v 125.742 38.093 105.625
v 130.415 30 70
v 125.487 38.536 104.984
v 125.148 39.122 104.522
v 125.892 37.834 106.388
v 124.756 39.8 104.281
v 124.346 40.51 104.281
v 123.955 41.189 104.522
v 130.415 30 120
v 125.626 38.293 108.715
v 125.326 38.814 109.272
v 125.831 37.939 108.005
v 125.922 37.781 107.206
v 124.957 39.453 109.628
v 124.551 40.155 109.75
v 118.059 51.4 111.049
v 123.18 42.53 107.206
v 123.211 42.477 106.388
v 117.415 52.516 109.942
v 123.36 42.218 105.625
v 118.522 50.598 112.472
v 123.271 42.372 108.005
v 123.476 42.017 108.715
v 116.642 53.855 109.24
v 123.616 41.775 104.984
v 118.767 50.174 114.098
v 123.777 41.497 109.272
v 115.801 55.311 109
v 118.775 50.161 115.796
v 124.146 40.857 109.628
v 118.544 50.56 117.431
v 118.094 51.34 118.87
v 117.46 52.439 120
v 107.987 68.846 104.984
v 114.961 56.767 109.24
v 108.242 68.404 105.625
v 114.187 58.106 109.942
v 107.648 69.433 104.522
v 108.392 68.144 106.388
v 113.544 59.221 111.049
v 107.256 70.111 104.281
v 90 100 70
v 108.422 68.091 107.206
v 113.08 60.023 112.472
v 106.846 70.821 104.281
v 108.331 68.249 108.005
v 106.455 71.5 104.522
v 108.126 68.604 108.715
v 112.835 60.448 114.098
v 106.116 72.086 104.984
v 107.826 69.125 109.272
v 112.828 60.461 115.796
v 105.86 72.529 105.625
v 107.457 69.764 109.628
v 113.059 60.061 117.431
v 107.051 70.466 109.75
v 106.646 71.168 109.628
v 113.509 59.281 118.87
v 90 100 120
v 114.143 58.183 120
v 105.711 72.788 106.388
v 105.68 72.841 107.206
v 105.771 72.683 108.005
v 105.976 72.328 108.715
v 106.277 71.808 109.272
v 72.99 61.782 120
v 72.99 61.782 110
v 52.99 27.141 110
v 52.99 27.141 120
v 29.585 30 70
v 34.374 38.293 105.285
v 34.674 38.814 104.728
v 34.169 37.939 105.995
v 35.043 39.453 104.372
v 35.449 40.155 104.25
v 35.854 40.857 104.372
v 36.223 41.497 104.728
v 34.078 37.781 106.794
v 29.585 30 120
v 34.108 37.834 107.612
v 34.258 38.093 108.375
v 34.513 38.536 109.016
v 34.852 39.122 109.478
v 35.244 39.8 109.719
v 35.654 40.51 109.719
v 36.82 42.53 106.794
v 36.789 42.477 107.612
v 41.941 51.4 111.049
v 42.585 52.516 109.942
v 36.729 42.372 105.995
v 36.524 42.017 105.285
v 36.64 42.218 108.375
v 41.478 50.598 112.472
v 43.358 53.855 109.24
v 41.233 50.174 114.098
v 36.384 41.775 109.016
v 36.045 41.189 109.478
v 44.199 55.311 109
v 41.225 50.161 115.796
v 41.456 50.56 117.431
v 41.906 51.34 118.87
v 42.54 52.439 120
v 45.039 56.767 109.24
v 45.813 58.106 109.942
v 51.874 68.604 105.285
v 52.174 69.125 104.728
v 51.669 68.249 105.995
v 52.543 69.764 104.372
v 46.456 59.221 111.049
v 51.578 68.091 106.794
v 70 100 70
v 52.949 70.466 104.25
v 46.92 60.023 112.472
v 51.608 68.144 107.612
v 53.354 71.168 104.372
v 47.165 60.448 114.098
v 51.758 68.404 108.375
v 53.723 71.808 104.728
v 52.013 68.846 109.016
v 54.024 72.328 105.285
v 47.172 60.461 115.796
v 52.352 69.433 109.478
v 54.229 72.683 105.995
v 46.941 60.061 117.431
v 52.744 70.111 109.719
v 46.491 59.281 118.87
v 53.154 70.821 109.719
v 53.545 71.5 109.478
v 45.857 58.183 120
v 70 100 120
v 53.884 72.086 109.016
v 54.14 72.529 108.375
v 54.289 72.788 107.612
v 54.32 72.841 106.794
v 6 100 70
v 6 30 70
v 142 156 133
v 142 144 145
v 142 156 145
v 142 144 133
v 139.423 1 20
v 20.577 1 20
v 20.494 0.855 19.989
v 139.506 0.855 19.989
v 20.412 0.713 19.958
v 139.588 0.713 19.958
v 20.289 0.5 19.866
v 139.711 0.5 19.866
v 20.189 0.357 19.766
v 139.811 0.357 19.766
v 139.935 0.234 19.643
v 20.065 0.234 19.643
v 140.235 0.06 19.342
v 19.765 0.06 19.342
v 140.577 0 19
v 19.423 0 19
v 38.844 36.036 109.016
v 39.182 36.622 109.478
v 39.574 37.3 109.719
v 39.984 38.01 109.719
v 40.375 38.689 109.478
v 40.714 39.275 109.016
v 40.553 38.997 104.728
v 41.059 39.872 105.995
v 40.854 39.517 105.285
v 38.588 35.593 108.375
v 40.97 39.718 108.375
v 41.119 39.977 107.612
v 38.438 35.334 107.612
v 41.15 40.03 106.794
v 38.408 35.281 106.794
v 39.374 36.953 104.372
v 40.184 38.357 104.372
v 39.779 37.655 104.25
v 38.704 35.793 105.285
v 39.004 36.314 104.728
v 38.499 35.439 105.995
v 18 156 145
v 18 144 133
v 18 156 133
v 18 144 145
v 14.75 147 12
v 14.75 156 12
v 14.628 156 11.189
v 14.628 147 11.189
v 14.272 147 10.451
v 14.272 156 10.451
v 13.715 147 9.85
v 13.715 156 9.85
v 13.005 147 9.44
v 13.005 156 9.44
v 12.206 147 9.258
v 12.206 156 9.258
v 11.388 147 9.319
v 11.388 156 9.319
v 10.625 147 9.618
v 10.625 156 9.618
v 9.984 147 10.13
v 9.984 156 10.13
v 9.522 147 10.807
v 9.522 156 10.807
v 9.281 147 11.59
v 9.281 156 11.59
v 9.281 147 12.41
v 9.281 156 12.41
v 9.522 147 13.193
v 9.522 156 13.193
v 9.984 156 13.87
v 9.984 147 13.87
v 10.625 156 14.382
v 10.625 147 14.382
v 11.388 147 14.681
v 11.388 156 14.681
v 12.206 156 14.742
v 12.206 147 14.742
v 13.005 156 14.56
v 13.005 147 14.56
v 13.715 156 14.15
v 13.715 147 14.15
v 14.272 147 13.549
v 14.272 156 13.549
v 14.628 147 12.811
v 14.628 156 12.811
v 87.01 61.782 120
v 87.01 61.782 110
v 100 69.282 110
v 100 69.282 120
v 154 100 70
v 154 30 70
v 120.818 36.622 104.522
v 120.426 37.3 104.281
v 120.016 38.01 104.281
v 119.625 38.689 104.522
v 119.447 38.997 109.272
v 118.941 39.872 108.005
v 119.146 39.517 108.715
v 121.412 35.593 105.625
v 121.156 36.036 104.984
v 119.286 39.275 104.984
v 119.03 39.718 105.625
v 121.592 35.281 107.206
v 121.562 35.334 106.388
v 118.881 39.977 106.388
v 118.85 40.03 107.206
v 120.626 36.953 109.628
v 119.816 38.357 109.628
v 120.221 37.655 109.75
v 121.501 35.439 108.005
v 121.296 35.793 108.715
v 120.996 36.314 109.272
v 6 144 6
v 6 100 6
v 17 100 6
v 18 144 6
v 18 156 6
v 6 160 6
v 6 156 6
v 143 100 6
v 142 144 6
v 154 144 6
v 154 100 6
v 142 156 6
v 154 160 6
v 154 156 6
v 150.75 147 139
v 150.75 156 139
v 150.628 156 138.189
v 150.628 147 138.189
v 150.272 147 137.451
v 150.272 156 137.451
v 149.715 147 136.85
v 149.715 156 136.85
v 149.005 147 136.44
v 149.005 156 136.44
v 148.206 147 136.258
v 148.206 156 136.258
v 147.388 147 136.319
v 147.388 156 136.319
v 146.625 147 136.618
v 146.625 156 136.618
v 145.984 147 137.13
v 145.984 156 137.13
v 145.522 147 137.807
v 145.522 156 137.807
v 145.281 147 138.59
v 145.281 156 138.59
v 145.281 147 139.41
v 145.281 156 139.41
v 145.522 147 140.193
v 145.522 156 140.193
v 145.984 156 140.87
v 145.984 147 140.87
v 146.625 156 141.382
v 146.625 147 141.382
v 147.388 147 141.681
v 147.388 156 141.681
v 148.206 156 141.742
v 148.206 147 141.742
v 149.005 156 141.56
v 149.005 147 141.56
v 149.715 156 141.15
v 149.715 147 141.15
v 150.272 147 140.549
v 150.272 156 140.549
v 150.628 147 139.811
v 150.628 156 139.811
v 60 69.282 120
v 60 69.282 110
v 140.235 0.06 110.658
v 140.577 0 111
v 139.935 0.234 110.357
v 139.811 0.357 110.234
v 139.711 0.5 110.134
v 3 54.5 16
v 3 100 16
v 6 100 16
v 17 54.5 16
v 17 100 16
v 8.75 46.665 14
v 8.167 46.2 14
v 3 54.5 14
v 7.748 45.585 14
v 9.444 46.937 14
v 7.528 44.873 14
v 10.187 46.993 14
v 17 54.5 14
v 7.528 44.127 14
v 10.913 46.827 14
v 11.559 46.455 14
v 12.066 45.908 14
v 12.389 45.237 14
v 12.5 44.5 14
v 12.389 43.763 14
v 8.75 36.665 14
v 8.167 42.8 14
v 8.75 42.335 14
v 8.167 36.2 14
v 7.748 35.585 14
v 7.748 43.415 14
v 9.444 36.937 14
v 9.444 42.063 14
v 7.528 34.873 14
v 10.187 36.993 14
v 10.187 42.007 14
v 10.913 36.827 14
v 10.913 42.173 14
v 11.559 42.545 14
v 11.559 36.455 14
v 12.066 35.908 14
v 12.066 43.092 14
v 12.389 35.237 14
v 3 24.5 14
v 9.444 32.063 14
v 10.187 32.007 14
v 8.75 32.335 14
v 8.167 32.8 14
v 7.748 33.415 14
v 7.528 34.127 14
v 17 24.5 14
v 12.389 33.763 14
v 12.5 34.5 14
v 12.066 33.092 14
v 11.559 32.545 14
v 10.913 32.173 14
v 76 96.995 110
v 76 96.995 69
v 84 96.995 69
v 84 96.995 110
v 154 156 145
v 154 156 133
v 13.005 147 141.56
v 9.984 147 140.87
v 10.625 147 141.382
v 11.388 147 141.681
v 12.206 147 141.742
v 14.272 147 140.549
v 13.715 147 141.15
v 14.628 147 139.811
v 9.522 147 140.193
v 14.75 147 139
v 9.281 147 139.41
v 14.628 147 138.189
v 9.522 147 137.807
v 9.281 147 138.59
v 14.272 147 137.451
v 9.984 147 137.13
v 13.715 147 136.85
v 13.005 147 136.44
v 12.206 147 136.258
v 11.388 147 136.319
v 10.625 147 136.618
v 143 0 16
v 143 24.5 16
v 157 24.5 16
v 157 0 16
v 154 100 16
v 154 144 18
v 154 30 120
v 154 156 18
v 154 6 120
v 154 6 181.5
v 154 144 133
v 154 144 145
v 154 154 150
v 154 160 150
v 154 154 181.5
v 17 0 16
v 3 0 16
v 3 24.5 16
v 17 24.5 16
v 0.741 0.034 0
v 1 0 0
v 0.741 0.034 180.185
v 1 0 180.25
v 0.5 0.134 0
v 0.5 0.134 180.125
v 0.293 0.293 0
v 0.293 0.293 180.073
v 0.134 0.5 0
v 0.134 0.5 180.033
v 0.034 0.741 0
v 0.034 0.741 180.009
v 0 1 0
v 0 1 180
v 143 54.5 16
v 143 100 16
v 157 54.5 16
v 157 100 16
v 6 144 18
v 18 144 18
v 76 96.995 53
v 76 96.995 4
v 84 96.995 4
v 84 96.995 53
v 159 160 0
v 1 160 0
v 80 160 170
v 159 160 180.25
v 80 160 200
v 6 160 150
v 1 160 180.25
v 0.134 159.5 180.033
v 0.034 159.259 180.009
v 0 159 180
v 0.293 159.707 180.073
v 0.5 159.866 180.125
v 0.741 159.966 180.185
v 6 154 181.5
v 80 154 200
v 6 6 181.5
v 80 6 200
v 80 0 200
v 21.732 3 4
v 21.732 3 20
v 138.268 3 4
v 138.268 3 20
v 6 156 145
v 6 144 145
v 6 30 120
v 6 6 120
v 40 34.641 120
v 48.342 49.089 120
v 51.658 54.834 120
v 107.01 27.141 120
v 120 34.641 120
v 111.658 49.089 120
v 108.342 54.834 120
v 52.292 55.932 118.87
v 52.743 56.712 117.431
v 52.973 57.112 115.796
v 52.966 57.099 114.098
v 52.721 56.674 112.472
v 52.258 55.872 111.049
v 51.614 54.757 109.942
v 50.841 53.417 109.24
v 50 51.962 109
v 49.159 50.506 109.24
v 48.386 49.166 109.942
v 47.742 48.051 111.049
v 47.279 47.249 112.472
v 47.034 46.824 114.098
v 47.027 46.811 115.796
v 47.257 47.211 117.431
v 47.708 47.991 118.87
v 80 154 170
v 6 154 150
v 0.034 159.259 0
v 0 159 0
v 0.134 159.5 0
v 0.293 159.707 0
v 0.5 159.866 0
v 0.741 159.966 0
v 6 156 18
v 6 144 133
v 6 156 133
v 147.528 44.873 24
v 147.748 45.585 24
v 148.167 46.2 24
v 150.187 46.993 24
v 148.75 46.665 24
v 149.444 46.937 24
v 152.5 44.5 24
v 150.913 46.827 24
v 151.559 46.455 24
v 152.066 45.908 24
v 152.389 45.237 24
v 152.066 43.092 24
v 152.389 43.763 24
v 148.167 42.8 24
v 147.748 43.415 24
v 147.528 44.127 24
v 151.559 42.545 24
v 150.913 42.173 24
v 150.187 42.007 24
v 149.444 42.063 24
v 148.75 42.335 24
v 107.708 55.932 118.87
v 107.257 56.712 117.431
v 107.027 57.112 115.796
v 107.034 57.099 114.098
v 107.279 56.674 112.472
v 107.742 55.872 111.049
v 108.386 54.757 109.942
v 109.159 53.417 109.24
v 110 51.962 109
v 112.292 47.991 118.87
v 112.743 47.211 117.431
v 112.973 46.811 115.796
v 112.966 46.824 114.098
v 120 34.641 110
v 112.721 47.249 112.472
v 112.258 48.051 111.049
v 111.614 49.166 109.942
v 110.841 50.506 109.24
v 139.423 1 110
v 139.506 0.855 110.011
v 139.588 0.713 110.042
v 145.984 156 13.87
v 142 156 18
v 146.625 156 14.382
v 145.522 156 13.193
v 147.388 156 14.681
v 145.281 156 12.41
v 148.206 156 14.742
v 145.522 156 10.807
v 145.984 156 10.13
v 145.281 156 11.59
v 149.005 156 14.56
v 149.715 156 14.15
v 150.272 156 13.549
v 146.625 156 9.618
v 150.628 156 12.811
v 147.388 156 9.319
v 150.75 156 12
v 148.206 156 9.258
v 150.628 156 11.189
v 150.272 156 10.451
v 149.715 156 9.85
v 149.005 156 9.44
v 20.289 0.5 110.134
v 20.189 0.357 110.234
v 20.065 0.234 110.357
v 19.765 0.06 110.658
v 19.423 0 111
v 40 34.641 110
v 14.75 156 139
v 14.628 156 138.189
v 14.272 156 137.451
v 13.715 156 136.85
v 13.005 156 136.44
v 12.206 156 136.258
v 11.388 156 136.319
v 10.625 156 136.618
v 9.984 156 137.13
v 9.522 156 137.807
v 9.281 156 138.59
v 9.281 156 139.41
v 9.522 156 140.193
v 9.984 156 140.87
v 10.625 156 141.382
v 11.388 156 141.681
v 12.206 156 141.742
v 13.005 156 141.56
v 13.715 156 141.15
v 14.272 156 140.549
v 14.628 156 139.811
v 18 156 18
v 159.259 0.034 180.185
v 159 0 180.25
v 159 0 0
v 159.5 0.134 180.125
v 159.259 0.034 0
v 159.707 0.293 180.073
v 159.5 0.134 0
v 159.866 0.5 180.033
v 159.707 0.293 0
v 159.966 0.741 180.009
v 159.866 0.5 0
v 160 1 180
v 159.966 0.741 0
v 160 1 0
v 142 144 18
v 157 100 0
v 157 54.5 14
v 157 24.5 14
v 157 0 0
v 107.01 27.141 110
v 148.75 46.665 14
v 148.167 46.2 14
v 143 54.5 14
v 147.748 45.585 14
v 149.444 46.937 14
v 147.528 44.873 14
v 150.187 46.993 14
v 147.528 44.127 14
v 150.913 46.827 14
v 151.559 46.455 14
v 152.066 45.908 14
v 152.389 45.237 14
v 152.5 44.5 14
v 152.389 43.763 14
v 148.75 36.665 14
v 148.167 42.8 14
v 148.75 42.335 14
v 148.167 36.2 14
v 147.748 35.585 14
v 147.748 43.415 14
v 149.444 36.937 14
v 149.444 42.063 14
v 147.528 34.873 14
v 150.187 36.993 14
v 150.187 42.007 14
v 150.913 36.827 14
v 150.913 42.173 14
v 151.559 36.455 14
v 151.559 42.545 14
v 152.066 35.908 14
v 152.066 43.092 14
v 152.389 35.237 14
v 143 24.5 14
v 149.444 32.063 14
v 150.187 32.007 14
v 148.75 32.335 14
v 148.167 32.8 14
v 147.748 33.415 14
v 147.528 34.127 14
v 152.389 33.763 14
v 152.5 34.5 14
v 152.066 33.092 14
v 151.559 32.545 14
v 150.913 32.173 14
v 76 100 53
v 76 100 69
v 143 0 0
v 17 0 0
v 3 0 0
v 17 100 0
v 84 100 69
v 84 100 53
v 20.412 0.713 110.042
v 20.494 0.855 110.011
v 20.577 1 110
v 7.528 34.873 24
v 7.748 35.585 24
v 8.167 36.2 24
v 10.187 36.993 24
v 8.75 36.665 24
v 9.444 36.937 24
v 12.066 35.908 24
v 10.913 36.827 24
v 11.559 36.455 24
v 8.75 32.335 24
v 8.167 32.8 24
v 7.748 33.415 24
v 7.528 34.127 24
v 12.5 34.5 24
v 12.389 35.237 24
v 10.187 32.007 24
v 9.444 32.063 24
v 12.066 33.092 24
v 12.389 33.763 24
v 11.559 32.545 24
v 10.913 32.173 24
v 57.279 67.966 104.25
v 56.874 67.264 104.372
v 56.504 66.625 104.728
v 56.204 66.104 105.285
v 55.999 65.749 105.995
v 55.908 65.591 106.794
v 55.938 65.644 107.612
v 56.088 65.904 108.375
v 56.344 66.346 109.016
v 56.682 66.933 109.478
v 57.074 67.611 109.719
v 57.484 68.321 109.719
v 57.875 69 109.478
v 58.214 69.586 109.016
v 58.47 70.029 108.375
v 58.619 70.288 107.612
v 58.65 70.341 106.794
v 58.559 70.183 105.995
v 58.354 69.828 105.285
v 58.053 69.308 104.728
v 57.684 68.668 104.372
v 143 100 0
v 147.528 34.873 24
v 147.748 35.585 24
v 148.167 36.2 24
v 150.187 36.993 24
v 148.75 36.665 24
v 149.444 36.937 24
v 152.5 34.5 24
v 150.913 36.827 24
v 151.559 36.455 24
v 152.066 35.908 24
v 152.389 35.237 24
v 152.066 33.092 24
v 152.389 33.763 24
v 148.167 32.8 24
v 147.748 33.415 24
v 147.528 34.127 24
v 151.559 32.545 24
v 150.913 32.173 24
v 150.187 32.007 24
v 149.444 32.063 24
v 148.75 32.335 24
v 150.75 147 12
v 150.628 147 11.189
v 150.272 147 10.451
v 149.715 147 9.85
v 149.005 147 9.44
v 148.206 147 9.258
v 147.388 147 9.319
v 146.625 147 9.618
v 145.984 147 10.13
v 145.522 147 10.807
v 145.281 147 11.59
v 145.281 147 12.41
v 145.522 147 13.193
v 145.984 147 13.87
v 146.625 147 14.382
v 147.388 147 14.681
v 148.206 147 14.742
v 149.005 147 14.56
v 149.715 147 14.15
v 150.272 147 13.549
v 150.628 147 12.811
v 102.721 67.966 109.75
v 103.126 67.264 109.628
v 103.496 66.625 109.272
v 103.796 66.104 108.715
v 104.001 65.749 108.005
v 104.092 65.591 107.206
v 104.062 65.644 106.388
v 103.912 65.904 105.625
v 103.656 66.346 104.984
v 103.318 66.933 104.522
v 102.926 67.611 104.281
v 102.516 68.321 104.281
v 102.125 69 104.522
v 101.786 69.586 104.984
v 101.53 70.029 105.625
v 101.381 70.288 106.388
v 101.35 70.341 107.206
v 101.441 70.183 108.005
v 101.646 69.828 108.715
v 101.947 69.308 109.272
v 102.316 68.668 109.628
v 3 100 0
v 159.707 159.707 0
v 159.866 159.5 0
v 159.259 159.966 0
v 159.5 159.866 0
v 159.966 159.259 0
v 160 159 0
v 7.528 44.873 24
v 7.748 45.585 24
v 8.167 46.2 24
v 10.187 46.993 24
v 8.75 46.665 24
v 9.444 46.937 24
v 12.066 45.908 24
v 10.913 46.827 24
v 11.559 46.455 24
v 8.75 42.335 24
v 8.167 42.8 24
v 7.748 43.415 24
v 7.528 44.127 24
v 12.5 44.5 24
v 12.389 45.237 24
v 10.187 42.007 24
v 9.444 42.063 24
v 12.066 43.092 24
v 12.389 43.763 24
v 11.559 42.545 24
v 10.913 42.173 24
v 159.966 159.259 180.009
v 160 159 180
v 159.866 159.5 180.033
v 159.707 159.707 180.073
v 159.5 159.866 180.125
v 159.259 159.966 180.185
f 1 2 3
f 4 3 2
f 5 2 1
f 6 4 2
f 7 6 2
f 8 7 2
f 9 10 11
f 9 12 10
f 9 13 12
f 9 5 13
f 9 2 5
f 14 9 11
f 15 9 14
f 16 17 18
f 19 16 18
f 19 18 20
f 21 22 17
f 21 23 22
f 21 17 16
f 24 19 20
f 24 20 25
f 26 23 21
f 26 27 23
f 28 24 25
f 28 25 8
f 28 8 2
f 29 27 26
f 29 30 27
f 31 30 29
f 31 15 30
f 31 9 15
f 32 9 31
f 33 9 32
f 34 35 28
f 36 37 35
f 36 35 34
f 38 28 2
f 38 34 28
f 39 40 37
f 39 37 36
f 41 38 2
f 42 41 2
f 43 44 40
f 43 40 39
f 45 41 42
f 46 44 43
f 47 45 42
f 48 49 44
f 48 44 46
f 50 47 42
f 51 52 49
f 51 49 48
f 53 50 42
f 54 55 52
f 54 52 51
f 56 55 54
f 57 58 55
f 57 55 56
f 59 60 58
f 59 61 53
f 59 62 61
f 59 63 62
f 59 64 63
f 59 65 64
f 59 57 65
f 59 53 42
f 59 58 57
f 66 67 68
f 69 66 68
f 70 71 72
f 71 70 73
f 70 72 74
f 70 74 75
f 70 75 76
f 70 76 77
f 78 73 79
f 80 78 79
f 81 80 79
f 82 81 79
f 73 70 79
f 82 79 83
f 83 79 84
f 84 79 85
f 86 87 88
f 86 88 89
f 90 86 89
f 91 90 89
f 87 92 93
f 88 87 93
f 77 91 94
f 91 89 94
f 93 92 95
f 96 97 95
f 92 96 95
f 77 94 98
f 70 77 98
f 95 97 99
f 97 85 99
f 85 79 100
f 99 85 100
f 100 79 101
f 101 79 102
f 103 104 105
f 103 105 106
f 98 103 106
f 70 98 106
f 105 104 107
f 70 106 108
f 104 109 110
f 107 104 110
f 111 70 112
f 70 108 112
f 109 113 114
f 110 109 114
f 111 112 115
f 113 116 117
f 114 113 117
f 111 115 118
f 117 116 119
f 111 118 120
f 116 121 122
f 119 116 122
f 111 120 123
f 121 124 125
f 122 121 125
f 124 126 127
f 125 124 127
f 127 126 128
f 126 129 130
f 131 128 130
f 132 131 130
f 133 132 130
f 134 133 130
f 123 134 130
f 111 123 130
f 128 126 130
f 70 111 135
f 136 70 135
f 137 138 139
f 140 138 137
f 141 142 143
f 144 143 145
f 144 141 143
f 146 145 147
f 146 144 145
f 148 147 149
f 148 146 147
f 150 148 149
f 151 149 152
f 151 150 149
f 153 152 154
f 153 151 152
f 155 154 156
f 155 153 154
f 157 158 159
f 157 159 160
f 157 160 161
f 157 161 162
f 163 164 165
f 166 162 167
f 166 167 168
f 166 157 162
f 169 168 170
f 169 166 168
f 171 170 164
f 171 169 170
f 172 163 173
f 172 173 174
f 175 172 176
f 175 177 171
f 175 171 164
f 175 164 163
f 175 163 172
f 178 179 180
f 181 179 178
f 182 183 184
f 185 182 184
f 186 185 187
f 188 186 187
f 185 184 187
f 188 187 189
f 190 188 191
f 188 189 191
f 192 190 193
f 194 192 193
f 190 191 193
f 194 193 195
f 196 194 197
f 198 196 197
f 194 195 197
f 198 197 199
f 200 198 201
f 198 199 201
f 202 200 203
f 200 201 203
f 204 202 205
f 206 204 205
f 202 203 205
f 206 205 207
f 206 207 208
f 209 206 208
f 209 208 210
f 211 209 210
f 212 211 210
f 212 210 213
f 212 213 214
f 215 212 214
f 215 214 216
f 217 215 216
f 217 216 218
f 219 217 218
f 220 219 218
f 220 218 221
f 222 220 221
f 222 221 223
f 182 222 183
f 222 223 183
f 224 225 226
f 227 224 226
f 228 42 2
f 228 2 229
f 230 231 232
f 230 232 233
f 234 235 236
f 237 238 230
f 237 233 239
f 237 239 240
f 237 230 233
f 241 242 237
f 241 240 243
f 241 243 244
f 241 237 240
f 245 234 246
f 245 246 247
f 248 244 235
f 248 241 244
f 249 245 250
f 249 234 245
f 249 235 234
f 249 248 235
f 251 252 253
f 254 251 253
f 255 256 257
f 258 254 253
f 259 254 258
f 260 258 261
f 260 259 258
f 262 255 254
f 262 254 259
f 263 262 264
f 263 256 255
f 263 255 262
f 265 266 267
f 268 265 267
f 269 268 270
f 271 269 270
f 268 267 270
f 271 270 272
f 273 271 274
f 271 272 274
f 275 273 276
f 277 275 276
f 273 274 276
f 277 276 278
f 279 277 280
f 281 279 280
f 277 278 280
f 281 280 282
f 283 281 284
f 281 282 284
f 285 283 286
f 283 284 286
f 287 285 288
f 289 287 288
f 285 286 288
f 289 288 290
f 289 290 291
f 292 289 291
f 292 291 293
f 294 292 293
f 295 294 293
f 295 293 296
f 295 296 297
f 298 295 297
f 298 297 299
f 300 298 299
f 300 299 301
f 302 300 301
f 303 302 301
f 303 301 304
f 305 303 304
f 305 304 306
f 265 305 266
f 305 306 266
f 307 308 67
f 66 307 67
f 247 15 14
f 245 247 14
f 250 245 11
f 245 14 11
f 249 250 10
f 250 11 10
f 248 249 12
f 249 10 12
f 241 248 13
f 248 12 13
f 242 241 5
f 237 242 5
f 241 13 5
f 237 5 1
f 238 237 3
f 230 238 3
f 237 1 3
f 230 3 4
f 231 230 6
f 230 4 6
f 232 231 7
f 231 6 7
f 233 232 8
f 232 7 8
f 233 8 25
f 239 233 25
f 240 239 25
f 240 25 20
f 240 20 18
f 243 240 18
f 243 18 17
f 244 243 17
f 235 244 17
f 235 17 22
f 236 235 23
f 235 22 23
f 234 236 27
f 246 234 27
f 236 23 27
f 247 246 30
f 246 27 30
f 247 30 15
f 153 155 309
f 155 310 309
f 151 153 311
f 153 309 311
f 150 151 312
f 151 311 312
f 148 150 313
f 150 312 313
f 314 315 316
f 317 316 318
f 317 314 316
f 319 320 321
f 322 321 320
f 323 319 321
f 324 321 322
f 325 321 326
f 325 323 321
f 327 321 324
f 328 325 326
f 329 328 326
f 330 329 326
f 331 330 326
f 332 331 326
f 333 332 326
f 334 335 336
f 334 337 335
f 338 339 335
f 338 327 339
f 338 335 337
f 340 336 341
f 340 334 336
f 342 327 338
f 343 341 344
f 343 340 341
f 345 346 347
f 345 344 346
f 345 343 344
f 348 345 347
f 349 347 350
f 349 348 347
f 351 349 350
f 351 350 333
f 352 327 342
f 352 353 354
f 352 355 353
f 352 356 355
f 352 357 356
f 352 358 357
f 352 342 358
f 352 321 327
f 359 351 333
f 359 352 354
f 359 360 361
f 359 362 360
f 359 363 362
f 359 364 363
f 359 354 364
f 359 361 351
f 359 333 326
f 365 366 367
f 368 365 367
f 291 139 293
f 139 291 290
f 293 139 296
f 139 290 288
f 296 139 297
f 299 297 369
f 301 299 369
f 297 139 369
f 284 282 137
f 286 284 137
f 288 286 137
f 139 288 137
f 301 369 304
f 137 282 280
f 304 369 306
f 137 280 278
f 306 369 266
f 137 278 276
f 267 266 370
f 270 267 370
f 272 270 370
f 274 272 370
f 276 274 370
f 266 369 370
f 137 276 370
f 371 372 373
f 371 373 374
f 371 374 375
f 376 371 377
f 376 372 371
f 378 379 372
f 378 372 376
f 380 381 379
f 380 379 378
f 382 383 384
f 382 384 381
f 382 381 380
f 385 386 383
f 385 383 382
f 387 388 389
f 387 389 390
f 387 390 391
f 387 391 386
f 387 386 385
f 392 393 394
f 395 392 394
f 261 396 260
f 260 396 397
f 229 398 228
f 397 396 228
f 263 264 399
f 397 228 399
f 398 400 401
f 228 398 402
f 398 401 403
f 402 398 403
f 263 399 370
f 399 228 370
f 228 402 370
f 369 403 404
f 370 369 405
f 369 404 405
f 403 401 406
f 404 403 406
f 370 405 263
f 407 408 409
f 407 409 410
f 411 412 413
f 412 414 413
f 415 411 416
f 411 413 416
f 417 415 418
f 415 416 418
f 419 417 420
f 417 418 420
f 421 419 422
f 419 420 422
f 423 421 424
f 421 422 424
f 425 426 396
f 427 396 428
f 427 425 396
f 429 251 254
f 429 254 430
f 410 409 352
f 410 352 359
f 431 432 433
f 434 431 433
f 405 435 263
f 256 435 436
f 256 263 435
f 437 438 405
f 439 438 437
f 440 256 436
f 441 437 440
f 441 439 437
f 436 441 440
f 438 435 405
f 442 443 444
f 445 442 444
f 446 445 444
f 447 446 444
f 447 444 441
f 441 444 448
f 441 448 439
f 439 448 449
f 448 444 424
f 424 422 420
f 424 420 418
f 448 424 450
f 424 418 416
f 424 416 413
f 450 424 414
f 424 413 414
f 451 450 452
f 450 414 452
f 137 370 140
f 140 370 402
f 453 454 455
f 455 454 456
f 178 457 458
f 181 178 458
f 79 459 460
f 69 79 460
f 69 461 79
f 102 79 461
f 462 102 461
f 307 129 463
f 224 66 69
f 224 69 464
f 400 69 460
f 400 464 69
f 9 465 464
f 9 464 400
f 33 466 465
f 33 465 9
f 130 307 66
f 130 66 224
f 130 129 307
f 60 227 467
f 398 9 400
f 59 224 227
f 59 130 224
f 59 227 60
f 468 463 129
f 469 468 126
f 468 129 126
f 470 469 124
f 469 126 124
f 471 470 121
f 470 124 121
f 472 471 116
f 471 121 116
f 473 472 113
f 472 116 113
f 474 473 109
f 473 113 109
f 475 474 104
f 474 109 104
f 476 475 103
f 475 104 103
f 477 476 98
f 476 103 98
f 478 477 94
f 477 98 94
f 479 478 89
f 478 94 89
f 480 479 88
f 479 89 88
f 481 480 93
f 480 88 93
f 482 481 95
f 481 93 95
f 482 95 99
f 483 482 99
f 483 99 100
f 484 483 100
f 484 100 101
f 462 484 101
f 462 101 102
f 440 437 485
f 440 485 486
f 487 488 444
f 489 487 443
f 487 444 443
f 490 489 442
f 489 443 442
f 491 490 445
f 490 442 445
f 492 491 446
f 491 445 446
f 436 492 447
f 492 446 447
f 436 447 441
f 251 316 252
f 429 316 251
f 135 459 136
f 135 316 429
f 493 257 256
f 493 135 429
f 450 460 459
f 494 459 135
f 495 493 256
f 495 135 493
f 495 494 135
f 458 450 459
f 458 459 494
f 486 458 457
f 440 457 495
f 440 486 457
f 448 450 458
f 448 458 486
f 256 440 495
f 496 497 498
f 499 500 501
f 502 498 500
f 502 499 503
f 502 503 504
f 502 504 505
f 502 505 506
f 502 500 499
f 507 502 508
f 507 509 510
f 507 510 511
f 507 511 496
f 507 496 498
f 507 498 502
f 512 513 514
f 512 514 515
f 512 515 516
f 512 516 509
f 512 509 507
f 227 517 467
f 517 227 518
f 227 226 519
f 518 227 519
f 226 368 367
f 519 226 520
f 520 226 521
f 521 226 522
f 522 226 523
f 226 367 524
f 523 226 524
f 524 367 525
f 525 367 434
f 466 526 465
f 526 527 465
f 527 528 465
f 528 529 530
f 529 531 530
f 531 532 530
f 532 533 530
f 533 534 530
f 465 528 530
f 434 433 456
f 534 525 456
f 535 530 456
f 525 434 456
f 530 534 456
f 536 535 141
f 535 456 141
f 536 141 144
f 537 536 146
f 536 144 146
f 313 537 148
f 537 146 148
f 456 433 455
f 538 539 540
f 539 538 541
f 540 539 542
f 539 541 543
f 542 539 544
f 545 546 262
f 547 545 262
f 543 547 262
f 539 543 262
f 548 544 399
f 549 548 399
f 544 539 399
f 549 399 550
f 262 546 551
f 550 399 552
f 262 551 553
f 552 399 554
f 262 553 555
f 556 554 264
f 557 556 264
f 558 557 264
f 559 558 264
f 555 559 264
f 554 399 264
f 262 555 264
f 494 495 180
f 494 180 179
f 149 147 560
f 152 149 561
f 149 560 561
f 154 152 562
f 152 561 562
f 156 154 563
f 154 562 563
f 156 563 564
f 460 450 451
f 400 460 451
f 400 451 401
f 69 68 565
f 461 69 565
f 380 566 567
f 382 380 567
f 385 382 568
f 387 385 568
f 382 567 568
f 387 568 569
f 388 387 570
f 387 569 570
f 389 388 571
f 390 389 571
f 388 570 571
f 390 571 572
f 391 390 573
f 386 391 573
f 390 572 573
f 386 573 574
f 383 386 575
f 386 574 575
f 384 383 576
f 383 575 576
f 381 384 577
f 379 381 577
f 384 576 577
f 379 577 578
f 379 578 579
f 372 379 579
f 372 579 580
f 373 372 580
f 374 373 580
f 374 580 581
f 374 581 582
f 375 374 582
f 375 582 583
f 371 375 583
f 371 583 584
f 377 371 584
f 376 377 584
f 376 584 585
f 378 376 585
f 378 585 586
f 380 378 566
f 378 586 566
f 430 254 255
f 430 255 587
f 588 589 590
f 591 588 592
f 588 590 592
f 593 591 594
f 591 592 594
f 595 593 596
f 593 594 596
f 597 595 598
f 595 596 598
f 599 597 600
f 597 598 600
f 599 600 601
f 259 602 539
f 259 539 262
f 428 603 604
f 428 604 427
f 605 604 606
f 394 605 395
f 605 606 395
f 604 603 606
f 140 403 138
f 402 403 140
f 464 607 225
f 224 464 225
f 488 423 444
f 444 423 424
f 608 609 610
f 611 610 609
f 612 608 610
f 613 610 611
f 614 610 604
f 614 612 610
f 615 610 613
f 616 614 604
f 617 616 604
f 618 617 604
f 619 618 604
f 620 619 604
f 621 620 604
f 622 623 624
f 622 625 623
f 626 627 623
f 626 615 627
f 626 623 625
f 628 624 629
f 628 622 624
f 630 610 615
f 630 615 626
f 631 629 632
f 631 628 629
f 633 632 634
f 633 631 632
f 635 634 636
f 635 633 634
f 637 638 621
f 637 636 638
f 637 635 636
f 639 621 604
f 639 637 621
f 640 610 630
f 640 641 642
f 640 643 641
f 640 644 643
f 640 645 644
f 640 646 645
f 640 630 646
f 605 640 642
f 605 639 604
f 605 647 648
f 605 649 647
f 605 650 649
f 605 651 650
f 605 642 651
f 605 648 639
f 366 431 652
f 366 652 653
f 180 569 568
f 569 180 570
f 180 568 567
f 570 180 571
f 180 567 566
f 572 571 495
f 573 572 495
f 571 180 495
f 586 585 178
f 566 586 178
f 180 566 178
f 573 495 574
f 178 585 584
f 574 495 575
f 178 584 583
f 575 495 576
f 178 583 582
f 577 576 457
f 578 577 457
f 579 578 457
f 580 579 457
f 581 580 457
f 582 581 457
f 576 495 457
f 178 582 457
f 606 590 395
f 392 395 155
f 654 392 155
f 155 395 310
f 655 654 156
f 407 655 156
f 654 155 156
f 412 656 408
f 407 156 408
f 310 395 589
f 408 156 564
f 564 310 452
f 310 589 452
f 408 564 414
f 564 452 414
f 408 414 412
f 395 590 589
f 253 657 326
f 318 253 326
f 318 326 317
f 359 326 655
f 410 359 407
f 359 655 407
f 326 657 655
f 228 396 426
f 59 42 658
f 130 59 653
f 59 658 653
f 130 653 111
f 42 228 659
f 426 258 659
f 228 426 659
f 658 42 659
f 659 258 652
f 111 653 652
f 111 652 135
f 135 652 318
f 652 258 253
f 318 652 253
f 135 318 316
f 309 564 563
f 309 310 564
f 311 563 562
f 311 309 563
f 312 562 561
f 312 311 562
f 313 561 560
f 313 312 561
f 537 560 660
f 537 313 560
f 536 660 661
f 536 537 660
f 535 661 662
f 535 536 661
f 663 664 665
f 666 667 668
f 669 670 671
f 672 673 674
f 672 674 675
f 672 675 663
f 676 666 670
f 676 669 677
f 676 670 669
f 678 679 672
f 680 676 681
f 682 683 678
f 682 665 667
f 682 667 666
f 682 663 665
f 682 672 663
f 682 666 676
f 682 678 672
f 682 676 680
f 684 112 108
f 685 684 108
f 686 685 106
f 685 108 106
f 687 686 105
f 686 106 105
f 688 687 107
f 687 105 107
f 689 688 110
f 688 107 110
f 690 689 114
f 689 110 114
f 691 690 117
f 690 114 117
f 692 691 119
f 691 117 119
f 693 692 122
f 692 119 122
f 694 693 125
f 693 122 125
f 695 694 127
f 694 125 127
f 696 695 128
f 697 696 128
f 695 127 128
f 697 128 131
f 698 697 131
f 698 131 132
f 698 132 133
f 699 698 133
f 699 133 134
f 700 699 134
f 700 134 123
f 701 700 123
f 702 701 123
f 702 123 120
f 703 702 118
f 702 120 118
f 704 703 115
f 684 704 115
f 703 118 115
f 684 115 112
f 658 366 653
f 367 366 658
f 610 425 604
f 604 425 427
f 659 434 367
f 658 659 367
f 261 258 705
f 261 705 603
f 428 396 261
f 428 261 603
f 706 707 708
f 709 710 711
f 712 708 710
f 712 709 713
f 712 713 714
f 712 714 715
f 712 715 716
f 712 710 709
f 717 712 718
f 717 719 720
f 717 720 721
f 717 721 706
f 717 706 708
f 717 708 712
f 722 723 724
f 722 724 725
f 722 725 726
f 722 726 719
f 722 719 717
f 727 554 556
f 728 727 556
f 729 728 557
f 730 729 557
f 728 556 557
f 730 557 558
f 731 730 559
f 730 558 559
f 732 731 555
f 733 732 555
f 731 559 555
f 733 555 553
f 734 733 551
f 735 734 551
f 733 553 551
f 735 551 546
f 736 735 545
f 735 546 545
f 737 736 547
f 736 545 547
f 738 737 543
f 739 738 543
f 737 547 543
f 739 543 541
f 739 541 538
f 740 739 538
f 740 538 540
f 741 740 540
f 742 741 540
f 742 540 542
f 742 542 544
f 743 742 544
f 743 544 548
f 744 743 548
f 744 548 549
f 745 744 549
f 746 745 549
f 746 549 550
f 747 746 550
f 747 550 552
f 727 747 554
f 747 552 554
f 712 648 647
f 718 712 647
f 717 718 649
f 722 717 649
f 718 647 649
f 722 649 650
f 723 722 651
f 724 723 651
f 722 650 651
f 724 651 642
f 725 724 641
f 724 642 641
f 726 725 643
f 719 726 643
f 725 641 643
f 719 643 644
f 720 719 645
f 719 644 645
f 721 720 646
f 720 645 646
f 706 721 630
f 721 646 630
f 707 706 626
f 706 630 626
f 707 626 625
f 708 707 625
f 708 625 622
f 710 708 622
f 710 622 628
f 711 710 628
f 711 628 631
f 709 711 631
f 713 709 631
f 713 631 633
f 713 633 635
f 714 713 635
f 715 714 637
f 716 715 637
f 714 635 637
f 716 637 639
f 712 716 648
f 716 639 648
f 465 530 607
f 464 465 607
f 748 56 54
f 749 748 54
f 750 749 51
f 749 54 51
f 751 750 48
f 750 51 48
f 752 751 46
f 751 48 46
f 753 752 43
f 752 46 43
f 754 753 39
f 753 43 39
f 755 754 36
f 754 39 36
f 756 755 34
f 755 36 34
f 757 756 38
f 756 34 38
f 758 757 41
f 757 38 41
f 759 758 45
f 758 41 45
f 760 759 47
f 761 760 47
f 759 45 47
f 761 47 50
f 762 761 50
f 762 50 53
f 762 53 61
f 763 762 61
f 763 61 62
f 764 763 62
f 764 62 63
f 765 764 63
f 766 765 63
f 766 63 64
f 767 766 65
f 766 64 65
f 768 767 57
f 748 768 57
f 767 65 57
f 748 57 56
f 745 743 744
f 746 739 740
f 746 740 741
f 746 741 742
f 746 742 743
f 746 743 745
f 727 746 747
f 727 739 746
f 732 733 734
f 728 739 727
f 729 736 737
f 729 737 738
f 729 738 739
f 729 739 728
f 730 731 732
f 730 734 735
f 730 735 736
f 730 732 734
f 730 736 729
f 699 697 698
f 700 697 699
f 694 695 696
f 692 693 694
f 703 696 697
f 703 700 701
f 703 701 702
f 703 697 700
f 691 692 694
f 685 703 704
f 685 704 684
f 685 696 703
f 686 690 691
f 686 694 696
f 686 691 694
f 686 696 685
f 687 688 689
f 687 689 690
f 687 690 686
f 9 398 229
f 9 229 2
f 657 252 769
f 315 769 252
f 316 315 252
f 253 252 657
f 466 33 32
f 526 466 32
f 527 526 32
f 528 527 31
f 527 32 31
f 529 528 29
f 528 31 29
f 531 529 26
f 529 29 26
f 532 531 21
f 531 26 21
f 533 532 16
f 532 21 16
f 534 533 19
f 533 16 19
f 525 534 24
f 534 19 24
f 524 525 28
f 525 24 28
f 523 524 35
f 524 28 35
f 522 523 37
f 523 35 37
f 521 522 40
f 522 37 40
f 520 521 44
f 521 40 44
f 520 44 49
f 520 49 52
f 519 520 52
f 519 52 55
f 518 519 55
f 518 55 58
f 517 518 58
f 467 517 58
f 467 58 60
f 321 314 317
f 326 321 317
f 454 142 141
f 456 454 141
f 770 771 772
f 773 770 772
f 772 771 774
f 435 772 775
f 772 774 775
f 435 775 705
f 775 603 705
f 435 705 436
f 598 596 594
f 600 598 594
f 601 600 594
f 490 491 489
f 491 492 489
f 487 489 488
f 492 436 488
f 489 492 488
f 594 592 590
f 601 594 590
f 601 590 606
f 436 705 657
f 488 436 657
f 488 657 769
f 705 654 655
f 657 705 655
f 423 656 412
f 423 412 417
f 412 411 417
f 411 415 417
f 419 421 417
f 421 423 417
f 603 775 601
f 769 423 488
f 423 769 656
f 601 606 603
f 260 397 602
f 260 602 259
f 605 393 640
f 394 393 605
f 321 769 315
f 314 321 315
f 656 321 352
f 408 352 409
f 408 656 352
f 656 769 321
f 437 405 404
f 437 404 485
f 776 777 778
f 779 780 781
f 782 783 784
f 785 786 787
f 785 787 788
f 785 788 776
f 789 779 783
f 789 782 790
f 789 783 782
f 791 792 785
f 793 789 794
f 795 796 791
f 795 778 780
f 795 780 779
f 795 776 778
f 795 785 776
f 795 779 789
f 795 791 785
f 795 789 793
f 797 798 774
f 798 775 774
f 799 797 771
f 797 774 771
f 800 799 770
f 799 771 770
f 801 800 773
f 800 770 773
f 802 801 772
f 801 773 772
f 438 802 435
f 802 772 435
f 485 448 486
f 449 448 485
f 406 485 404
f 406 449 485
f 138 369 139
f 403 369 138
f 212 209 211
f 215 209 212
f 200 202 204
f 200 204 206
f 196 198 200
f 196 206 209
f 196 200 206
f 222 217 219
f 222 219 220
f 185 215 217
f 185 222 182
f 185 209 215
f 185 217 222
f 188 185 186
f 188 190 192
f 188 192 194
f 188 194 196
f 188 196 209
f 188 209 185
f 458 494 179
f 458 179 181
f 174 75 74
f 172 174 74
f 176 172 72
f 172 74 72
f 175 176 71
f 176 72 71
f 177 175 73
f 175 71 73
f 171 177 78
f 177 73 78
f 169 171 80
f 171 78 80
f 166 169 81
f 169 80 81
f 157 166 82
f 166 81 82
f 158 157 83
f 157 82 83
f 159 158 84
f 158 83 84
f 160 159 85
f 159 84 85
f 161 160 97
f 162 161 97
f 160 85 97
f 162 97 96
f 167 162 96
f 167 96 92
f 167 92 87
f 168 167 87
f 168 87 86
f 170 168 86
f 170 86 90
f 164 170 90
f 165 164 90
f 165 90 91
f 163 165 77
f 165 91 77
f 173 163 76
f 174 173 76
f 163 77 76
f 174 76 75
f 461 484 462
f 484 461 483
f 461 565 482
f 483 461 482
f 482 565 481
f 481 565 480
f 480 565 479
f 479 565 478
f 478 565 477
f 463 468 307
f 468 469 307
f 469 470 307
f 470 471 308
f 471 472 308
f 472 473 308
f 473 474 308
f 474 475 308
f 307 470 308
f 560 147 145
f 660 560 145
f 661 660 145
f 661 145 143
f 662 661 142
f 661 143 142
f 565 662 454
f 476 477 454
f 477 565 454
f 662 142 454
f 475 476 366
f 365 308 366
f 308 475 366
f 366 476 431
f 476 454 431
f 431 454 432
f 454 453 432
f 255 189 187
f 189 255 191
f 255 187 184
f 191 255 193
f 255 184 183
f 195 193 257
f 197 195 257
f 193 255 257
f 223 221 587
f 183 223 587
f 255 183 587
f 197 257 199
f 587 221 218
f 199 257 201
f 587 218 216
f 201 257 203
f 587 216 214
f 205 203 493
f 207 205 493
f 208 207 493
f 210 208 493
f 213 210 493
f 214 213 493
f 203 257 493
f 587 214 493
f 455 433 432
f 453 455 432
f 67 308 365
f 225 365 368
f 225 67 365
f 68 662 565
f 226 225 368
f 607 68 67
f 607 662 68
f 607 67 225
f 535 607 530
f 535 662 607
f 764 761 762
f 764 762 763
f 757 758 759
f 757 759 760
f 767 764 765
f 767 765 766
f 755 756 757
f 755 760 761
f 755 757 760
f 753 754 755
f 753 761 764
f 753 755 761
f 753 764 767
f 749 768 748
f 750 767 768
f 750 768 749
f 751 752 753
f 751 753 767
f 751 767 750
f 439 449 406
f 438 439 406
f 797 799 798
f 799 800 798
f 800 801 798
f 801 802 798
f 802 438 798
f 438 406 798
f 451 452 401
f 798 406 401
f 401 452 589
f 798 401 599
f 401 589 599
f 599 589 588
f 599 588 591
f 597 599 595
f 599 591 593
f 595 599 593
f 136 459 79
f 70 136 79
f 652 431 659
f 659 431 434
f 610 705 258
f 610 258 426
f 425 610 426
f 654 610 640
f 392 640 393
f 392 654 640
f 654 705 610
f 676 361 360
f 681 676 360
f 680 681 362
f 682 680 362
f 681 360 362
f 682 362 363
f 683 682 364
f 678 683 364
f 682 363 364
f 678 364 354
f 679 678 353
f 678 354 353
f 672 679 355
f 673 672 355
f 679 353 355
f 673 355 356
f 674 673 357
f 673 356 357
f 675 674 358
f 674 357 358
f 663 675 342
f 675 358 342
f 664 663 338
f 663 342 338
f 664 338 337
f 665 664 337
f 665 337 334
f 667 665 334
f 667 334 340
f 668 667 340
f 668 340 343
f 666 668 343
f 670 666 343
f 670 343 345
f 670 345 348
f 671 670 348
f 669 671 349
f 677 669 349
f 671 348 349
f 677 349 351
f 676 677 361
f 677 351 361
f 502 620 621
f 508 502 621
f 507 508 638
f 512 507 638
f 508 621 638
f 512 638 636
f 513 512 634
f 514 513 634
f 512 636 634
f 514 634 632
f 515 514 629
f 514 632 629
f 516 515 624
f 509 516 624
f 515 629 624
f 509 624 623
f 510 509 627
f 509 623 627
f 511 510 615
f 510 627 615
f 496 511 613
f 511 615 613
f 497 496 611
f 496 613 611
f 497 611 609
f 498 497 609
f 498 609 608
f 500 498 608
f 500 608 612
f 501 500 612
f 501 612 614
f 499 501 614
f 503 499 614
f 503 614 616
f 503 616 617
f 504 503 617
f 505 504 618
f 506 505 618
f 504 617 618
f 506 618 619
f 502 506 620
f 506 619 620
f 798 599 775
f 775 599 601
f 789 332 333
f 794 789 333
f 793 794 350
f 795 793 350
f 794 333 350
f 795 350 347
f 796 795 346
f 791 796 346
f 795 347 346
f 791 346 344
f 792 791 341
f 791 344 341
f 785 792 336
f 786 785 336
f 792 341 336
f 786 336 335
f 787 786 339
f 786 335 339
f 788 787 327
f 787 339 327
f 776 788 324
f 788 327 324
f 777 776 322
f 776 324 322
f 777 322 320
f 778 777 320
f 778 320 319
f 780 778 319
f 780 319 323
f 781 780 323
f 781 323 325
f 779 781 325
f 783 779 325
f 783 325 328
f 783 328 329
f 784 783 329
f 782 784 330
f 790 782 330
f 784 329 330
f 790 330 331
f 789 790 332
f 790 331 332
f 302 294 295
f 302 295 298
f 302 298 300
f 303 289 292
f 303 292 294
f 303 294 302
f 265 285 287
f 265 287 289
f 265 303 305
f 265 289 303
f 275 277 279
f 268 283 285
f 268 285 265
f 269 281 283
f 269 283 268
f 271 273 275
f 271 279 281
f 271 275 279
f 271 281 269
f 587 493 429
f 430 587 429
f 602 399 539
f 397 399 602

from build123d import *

# Parameters (mm, degrees)
PAD_DEPTH       = 160
SKETCH001_W     = 120
SKETCH001_H     = 90
POCKET_DEPTH    = 100
PAD001_DEPTH    = 90
POCKET001_DEPTH = 16
POCKET002_DEPTH = 60
SKETCH006_W     = 148
SKETCH006_H     = 148
POCKET004_DEPTH = 80
SKETCH007_W     = 14
SKETCH007_H     = 16
SKETCH007_W_2   = 14.0000000001
SKETCH007_H_2   = 15.9999999999
POCKET005_DEPTH = 100
SKETCH008_W     = 14
SKETCH008_H     = 30
SKETCH008_W_2   = 14.0000000001
SKETCH008_H_2   = 29.9999999999
PAD002_DEPTH    = 2
POCKET008_DEPTH = 10
POCKET009_DEPTH = 50
SKETCH009_R     = 2.5
POCKET010_DEPTH = 10
SKETCH005_W     = 8
SKETCH005_H     = 16
POCKET011_DEPTH = 5
SKETCH012_R     = 6
POCKET012_DEPTH = 10
SKETCH013_R     = 2.75
POCKET013_DEPTH = 5
SKETCH015_R     = 6
POCKET014_DEPTH = 10
SKETCH016_R     = 2.75
POCKET015_DEPTH = 5
SKETCH017_W     = 12
SKETCH017_H     = 12
PAD003_DEPTH    = 12
SKETCH018_W     = 12
SKETCH018_H     = 12
PAD004_DEPTH    = 12
SKETCH019_R     = 2.75
POCKET016_DEPTH = 9
FILLET_R        = 1


with BuildPart() as part:
    # Sketch → Pad (new body)
    with BuildSketch(Plane.XZ):
        Polygon((0, 0), (0, 180), (80, 200), (160, 180), (160, 0), align=None)
    extrude(amount=-PAD_DEPTH)

    # Sketch001 (on Face6 of Pad) → Pocket (cut)
    with BuildSketch(Plane.XZ):
        with Locations((80, 65)):
            Rectangle(SKETCH001_W, SKETCH001_H)
    extrude(amount=-POCKET_DEPTH, mode=Mode.SUBTRACT)

    # Sketch002 (on Face10 of Pocket) → Pad001 (join)
    with BuildSketch(Plane(origin=(0, 0, 20), x_dir=(-1, 0, 0), z_dir=(0, 0, 1))):
        Polygon((-20, 0), (-76, -96.9948452239), (-84, -96.9948452239), (-140, 0), (-140, -100), (-20, -100), align=None)
    extrude(amount=PAD001_DEPTH)

    # Sketch003 (on Face10 of Pad001) → Pocket001 (cut)
    with BuildSketch(Plane(origin=(0, 0, 20), x_dir=(-1, 0, 0), z_dir=(0, 0, 1))):
        Polygon((-21.7320508076, -3), (-138.2679491924, -3), (-84, -96.9948452239), (-76, -96.9948452239), align=None)
    extrude(amount=-POCKET001_DEPTH, mode=Mode.SUBTRACT)

    # Sketch004 (on Face5 of Pocket001) → Pocket002 (cut)
    with BuildSketch(Plane(origin=(0, 160, 0), x_dir=(1, 0, 0), z_dir=(0, 1, 0))):
        Polygon((6, -150), (6, -6), (154, -6), (154, -150), (80, -170), align=None)
    extrude(amount=-POCKET002_DEPTH, mode=Mode.SUBTRACT)

    # Sketch006 → Pocket004 (cut)
    with BuildSketch(Plane.XY.offset(200)):
        with Locations((80, 80)):
            Rectangle(SKETCH006_W, SKETCH006_H)
    extrude(amount=-POCKET004_DEPTH, mode=Mode.SUBTRACT)

    # Sketch007 (on Face4 of Pocket004) → Pocket005 (cut)
    with BuildSketch(Plane.XZ):
        with Locations((10, 8)):
            Rectangle(SKETCH007_W, SKETCH007_H)
        with Locations((150, 8)):
            Rectangle(SKETCH007_W_2, SKETCH007_H_2)
    extrude(amount=-POCKET005_DEPTH, mode=Mode.SUBTRACT)

    # Sketch008 (on Face17 of Pocket005) → Pad002 (join)
    with BuildSketch(Plane(origin=(0, 0, 16), x_dir=(1, 0, 0), z_dir=(0, 0, -1))):
        with Locations((10, -39.5)):
            Rectangle(SKETCH008_W, SKETCH008_H)
        with Locations((150, -39.5)):
            Rectangle(SKETCH008_W_2, SKETCH008_H_2)
    extrude(amount=PAD002_DEPTH)

    # Sketch010 → Pocket008 (cut)
    with BuildSketch(Plane(origin=(0, 0, 110), x_dir=(1, 0, 0), z_dir=(0, 0, -1))):
        Polygon((40, -34.6410161514), (60, -69.2820323028), (72.9903810568, -61.7820323028), (52.9903810568, -27.1410161514), align=None)
        Polygon((107.0096189432, -27.1410161514), (87.0096189432, -61.7820323028), (100, -69.2820323028), (120, -34.6410161514), align=None)
    extrude(amount=-POCKET008_DEPTH, mode=Mode.SUBTRACT)

    # Sketch011 (on Face39 of Pocket008) → Pocket009 (cut)
    with BuildSketch(Plane(origin=(0, 0, 120), x_dir=(-1, 0, 0), z_dir=(0, 0, 1))):
        Polygon((-130.4145188433, -30), (-90, -100), (-154, -100), (-154, -30), align=None)
        Polygon((-29.5854811567, -30), (-70, -100), (-6, -100), (-6, -30), align=None)
    extrude(amount=-POCKET009_DEPTH, mode=Mode.SUBTRACT)

    # Sketch009 (on Face29 of Pocket009) → Pocket010 (cut)
    with BuildSketch(Plane(origin=(0, 0, 14), x_dir=(1, 0, 0), z_dir=(0, 0, -1))):
        with Locations((10, -34.5)):
            Circle(SKETCH009_R)
        with Locations((10, -44.5)):
            Circle(SKETCH009_R)
        with Locations((150, -34.5)):
            Circle(SKETCH009_R)
        with Locations((150, -44.5)):
            Circle(SKETCH009_R)
    extrude(amount=-POCKET010_DEPTH, mode=Mode.SUBTRACT)

    # Sketch005 (on Face44 of Pocket009) → Pocket011 (cut)
    with BuildSketch(Plane.XZ.offset(-96.9948452239)):
        with Locations((80, 61)):
            Rectangle(SKETCH005_W, SKETCH005_H)
    extrude(amount=-POCKET011_DEPTH, mode=Mode.SUBTRACT)

    # Sketch012 (on Face61 of Pocket011) → Pocket012 (cut)
    with BuildSketch(Plane(origin=(9.1987298108, -5.3108891325, 0), x_dir=(0, 0, -1), z_dir=(-0.8660254038, 0.5, 0))):
        with Locations((-115, -70)):
            Circle(SKETCH012_R)
    extrude(amount=-POCKET012_DEPTH, mode=Mode.SUBTRACT)

    # Sketch013 (on Face64 of Pocket012) → Pocket013 (cut)
    with BuildSketch(Plane(origin=(9.1987298108, -5.3108891325, 0), x_dir=(0, 0, -1), z_dir=(-0.8660254038, 0.5, 0))):
        with Locations((-107, -52.5)):
            Circle(SKETCH013_R)
        with Locations((-107, -87.5)):
            Circle(SKETCH013_R)
    extrude(amount=-POCKET013_DEPTH, mode=Mode.SUBTRACT)

    # Sketch015 (on Face65 of Pocket013) → Pocket014 (cut)
    with BuildSketch(Plane(origin=(110.8012701892, 63.9711431703, 0), x_dir=(0, 0, 1), z_dir=(0.8660254038, 0.5, 0))):
        with Locations((115, 10)):
            Circle(SKETCH015_R)
    extrude(amount=-POCKET014_DEPTH, mode=Mode.SUBTRACT)

    # Sketch016 (on Face67 of Pocket014) → Pocket015 (cut)
    with BuildSketch(Plane(origin=(110.8012701892, 63.9711431703, 0), x_dir=(0, 0, 1), z_dir=(0.8660254038, 0.5, 0))):
        with Locations((107, 27.5)):
            Circle(SKETCH016_R)
        with Locations((107, -7.5)):
            Circle(SKETCH016_R)
    extrude(amount=-POCKET015_DEPTH, mode=Mode.SUBTRACT)

    # Sketch017 (on Face25 of Pocket015) → Pad003 (join)
    with BuildSketch(Plane(origin=(154, 0, 0), x_dir=(0, 0, -1), z_dir=(-1, 0, 0))):
        with Locations((-12, -150)):
            Rectangle(SKETCH017_W, SKETCH017_H)
        with Locations((-139, -150)):
            Rectangle(SKETCH017_W, SKETCH017_H)
    extrude(amount=PAD003_DEPTH)

    # Sketch018 (on Face27 of Pad003) → Pad004 (join)
    with BuildSketch(Plane(origin=(6, 0, 0), x_dir=(0, 0, 1), z_dir=(1, 0, 0))):
        with Locations((12, -150)):
            Rectangle(SKETCH018_W, SKETCH018_H)
        with Locations((139, -150)):
            Rectangle(SKETCH018_W, SKETCH018_H)
    extrude(amount=PAD004_DEPTH)

    # Sketch019 (on Face68 of Pad004) → Pocket016 (cut)
    with BuildSketch(Plane(origin=(0, 156, 0), x_dir=(1, 0, 0), z_dir=(0, 1, 0))):
        with Locations((148, -12)):
            Circle(SKETCH019_R)
        with Locations((148, -139)):
            Circle(SKETCH019_R)
        with Locations((12, -139)):
            Circle(SKETCH019_R)
        with Locations((12, -12)):
            Circle(SKETCH019_R)
    extrude(amount=-POCKET016_DEPTH, mode=Mode.SUBTRACT)

    # Fillet
    fillet_edges = [part.edges().sort_by_distance(p)[0] for p in [
        (0, 160, 90),
        (0, 0, 90),
        (160, 0, 90),
        (80, 0, 20),
        (20, 0, 65),
        (80, 0, 110),
        (140, 0, 65),
        (160, 160, 90),
    ]]
    fillet(fillet_edges, radius=FILLET_R)


solid = part.part
